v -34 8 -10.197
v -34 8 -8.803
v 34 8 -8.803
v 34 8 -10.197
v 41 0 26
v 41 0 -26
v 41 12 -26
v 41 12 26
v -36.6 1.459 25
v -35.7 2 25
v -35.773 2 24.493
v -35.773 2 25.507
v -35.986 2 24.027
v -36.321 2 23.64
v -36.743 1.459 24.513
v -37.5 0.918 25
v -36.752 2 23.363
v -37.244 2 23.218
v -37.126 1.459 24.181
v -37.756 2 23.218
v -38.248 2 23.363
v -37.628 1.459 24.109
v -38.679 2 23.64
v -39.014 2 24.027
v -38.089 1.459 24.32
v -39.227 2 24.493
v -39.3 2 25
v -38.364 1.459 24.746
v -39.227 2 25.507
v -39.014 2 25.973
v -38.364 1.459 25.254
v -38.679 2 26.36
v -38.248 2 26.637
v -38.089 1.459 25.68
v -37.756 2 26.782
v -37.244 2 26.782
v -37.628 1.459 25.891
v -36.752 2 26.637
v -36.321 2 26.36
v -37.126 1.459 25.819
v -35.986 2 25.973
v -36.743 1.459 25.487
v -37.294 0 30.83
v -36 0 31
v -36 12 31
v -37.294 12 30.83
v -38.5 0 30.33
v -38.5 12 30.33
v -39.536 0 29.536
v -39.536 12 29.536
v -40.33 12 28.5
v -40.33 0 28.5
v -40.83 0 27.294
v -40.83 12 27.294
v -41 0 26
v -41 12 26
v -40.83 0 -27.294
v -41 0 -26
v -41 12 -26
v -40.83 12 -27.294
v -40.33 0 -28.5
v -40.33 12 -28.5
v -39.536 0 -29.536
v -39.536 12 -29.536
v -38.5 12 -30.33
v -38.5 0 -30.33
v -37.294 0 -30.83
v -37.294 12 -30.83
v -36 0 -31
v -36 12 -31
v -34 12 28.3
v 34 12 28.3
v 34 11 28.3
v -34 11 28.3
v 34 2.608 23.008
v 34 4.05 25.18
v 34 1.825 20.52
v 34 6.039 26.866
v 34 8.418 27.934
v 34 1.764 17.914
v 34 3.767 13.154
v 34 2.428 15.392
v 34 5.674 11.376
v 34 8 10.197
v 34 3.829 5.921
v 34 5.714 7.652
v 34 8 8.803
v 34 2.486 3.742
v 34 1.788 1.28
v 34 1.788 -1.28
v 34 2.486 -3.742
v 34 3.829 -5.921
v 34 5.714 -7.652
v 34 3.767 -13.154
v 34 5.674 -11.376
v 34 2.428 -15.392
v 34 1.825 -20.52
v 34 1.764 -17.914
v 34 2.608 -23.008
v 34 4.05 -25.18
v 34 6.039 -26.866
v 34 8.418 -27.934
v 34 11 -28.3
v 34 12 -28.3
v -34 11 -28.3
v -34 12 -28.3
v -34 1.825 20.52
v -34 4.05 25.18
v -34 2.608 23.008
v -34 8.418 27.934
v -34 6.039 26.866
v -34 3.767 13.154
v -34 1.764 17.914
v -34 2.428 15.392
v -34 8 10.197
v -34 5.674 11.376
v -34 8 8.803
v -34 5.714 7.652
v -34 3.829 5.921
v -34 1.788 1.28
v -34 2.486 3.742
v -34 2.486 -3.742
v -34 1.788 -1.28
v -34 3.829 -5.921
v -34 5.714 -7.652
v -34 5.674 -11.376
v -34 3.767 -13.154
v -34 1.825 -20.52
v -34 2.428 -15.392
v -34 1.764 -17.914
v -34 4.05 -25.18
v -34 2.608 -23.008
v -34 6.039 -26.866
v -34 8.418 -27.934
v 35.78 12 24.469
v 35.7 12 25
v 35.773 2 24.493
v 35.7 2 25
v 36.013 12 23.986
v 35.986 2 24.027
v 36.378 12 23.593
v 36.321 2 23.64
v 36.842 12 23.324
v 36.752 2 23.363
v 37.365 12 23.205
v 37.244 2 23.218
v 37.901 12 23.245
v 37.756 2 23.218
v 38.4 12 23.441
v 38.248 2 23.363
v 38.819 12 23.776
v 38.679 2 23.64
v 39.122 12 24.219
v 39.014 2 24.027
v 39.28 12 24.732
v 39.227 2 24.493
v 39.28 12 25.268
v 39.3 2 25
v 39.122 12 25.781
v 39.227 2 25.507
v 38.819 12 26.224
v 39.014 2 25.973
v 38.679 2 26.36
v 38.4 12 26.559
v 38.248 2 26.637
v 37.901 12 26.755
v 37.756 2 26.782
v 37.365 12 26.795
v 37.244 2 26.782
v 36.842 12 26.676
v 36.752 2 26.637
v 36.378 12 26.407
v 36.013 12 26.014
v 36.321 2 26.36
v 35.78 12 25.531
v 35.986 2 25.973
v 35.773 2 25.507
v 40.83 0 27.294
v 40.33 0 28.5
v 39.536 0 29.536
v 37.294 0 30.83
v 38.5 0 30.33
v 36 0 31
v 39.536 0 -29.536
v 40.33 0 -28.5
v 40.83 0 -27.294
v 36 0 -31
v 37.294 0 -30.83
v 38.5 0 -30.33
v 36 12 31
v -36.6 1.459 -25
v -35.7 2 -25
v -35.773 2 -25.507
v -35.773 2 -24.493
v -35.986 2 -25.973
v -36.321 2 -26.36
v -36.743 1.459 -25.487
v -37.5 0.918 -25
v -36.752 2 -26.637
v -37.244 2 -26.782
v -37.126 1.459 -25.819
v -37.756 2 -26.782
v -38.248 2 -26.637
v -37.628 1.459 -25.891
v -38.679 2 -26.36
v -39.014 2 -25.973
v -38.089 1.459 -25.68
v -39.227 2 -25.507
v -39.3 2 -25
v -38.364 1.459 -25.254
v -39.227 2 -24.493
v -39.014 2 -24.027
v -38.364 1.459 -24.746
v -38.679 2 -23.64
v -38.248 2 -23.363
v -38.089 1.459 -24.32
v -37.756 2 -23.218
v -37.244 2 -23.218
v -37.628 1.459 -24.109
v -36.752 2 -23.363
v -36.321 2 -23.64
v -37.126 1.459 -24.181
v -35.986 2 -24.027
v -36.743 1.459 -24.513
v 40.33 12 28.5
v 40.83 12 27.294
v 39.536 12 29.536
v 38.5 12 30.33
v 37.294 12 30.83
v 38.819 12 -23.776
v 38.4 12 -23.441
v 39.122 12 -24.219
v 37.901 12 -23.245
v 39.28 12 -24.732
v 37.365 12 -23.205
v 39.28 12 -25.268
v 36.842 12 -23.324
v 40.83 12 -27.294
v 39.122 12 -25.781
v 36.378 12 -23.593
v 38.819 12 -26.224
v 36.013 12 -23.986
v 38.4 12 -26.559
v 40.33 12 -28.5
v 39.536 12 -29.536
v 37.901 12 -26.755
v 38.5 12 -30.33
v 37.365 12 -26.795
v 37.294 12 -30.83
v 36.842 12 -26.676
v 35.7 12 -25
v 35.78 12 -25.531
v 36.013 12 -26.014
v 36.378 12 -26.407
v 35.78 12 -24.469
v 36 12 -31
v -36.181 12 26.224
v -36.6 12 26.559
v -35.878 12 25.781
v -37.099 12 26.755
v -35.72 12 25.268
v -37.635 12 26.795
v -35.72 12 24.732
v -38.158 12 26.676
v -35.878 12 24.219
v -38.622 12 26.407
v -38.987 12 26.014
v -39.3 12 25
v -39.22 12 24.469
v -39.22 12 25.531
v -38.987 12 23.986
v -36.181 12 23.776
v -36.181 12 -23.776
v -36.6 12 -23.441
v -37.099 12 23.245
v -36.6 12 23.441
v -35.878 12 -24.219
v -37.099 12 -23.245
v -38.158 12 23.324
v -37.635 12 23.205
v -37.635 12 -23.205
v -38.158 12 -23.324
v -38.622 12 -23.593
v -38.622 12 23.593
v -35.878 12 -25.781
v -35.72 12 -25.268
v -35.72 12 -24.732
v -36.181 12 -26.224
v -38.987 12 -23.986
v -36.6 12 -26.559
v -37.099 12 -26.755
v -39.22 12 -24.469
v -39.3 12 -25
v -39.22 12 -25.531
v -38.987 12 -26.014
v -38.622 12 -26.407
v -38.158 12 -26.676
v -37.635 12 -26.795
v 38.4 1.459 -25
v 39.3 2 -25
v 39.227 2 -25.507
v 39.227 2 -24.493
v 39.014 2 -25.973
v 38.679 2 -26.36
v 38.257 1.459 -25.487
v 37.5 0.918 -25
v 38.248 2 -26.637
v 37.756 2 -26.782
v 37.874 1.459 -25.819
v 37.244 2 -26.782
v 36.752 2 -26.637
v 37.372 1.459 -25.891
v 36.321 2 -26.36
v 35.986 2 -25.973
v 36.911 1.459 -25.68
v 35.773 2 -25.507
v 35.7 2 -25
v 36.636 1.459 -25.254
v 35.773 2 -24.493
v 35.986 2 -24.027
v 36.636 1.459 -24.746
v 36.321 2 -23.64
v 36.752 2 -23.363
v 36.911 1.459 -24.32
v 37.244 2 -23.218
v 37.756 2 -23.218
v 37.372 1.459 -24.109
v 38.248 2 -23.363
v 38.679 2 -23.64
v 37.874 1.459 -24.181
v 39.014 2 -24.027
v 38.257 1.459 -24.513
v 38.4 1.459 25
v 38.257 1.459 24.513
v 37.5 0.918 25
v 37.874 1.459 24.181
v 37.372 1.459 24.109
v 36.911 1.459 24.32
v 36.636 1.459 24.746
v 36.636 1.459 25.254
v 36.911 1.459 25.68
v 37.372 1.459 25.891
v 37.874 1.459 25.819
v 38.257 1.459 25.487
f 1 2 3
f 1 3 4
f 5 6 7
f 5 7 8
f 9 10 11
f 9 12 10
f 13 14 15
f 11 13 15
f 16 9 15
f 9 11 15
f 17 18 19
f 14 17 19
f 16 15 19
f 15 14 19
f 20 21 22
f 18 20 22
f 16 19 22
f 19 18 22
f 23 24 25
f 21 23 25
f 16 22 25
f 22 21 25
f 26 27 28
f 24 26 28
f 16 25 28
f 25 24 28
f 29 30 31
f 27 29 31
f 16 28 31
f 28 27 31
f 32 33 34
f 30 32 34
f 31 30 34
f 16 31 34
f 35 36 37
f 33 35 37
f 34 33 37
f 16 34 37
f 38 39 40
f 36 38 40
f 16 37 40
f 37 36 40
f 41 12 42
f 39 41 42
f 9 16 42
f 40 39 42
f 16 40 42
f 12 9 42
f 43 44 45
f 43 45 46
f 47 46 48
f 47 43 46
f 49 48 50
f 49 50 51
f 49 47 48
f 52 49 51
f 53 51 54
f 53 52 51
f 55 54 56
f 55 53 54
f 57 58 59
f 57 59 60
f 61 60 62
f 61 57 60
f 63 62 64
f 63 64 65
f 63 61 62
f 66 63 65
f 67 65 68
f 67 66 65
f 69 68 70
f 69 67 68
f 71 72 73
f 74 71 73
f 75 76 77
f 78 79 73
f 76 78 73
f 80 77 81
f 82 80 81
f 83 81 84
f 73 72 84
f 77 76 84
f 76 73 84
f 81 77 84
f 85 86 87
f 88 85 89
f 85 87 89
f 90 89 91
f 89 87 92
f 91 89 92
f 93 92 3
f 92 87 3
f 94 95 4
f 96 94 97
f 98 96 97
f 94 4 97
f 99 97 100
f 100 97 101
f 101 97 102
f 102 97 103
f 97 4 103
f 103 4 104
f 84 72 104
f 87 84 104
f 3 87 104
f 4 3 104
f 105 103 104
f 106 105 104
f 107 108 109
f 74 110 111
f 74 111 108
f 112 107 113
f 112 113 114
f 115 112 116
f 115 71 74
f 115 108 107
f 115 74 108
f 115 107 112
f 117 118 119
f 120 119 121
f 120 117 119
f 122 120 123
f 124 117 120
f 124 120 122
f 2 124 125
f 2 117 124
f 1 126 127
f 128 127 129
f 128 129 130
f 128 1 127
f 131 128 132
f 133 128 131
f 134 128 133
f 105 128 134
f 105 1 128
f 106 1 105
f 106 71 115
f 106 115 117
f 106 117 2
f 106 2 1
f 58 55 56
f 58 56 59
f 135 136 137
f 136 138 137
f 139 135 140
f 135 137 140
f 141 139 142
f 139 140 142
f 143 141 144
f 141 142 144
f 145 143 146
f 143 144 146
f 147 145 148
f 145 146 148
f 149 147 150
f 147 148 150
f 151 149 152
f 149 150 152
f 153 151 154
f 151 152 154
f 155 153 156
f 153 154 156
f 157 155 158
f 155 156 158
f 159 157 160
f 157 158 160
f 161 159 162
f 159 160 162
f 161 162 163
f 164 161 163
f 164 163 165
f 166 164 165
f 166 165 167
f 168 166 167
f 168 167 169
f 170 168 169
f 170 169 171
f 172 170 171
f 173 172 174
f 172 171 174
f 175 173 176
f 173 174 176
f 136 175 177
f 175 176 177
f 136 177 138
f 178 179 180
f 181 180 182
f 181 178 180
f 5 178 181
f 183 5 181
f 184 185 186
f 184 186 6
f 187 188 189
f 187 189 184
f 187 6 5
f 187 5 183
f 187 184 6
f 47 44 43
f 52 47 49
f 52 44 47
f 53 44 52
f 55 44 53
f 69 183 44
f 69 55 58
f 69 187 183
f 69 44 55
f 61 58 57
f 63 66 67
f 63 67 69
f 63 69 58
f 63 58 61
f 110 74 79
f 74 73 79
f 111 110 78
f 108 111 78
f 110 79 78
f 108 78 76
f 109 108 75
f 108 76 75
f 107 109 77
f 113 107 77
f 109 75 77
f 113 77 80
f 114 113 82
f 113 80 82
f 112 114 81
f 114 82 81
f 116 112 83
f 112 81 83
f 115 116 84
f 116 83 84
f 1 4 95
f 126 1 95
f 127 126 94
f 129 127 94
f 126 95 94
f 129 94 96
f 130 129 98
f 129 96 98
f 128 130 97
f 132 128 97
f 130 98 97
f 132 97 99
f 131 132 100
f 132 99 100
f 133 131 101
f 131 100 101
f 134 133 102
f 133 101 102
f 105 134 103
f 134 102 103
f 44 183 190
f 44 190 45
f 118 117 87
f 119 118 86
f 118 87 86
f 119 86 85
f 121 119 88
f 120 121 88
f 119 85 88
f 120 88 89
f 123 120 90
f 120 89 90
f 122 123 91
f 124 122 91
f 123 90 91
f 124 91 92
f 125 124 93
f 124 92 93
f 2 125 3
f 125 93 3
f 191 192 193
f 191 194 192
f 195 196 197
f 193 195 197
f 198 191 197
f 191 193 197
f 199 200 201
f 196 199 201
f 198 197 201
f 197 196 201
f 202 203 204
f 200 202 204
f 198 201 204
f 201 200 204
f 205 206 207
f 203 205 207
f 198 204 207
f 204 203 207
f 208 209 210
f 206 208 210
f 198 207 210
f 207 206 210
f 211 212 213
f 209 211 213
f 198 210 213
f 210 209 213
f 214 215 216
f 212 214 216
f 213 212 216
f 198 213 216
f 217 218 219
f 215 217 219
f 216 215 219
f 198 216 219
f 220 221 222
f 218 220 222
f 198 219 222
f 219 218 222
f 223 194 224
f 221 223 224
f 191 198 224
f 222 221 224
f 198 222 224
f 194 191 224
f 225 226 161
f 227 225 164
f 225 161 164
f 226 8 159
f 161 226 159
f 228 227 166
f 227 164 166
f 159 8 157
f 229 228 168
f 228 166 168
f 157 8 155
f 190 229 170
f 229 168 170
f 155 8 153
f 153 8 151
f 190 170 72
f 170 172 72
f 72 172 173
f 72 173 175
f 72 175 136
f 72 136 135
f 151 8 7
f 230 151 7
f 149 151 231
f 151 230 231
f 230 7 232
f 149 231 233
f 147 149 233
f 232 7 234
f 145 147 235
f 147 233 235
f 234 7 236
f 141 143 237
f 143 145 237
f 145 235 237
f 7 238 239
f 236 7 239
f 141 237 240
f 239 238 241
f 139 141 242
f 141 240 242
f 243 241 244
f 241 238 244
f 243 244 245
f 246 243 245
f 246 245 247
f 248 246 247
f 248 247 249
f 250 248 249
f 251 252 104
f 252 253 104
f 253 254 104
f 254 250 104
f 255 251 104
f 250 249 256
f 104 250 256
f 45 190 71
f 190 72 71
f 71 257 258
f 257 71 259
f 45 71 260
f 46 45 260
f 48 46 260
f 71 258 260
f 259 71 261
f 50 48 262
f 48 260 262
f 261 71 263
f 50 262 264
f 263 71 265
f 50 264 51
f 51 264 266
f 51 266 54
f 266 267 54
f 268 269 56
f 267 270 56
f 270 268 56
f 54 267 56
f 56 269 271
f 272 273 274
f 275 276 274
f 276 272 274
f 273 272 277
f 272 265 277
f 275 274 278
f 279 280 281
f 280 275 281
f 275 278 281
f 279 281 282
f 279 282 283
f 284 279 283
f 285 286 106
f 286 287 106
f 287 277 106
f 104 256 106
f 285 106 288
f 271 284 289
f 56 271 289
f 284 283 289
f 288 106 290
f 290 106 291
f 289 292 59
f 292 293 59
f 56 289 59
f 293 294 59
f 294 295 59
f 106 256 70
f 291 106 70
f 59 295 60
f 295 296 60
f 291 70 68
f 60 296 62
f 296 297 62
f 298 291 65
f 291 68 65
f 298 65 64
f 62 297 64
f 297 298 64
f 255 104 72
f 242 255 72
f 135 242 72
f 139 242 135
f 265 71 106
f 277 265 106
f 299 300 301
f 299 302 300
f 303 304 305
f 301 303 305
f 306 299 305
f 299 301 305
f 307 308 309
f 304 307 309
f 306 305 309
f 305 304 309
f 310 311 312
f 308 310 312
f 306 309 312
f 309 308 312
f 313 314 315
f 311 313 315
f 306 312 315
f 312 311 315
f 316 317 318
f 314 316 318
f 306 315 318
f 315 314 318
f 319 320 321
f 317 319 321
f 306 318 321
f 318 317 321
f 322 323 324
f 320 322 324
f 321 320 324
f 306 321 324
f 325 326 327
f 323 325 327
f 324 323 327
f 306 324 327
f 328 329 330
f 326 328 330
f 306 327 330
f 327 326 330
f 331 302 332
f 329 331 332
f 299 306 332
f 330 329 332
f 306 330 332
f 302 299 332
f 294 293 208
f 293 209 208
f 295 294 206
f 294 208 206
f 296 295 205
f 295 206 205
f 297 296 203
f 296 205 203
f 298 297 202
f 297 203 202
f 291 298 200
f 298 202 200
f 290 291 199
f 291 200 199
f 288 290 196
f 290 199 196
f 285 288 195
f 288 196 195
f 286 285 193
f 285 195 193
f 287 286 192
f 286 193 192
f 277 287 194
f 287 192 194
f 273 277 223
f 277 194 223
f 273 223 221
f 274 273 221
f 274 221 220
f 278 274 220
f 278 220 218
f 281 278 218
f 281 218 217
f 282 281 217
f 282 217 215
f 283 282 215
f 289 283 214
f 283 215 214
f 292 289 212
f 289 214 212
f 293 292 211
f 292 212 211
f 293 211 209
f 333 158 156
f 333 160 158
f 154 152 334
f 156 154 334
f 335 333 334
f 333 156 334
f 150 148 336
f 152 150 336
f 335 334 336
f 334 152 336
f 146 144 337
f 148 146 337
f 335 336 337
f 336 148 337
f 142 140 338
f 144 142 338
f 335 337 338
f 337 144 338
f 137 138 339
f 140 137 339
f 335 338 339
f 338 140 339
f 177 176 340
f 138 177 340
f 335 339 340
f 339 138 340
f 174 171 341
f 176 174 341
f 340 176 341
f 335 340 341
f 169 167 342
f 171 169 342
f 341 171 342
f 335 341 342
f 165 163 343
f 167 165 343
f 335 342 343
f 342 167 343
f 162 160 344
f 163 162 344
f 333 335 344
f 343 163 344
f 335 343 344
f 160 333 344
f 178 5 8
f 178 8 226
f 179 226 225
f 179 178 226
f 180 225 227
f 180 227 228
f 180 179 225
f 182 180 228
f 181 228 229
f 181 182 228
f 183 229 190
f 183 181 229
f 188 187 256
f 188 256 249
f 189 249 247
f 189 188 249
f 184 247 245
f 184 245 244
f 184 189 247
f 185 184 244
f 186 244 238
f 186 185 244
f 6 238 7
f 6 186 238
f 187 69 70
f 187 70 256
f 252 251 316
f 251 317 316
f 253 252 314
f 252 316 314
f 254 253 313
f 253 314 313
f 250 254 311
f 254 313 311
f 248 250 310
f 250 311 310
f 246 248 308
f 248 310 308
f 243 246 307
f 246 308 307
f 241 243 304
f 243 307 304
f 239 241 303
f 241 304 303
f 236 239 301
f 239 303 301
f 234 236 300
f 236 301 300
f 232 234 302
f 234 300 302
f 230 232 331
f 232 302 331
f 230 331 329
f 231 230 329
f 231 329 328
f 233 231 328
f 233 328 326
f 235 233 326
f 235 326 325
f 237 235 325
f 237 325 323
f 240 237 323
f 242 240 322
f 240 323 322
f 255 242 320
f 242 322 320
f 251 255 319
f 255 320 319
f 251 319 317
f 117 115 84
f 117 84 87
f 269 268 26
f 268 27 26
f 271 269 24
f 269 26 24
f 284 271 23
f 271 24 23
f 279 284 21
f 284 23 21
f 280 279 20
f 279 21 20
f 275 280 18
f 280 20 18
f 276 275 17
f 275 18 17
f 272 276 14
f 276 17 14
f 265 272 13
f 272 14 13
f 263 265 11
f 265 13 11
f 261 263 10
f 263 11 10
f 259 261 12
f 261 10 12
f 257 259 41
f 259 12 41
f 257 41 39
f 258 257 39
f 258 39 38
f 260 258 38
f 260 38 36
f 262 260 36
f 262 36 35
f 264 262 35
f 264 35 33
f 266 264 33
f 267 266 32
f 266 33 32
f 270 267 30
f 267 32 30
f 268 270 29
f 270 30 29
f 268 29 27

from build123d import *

# Parameters (mm, degrees)
BOSS_EXTRUDE1_DEPTH            = 12
CUT_EXTRUDE1_DEPTH             = 34
F_3_6_3_6_DIAMETER_HOLE1_D     = 3.6
F_3_6_3_6_DIAMETER_HOLE1_DEPTH = 10
F_3_6_3_6_DIAMETER_HOLE1_TIP   = 1.081549114


with BuildPart() as part:
    # Sketch1 → Boss-Extrude1 (new body)
    with BuildSketch(Plane(origin=(0, 0, 0), x_dir=(1, 0, 0), z_dir=(0, 1, 0))):
        with BuildLine():
            Line((-36, 31), (36, 31))
            ThreePointArc((36, 31), (39.535533906, 29.535533906), (41, 26))
            Line((41, 26), (41, -26))
            ThreePointArc((41, -26), (39.535533906, -29.535533906), (36, -31))
            Line((36, -31), (-36, -31))
            ThreePointArc((-36, -31), (-39.535533906, -29.535533906), (-41, -26))
            Line((-41, -26), (-41, 26))
            ThreePointArc((-41, 26), (-39.535533906, 29.535533906), (-36, 31))
        make_face()
    extrude(amount=BOSS_EXTRUDE1_DEPTH)

    # Sketch2 → Cut-Extrude1 (cut, symmetric)
    with BuildSketch(Plane(origin=(0, 0, 0), x_dir=(0, 0, -1), z_dir=(1, 0, 0))):
        with BuildLine():
            Line((-10.197159549, 8), (-8.802840451, 8))
            ThreePointArc((-8.802840451, 8), (0, 1.7), (8.802840451, 8))
            Line((8.802840451, 8), (10.197159549, 8))
            ThreePointArc((10.197159549, 8), (20.520457794, 1.825131712), (28.3, 11))
            Line((28.3, 11), (28.3, 17.866390663))
            Line((28.3, 17.866390663), (-28.3, 17.866390663))
            Line((-28.3, 17.866390663), (-28.3, 11))
            ThreePointArc((-28.3, 11), (-20.520457794, 1.825131712), (-10.197159549, 8))
        make_face()
    extrude(amount=CUT_EXTRUDE1_DEPTH, both=True, mode=Mode.SUBTRACT)

    # Ø3.6 (3.6) Diameter Hole1
    with Locations(Plane(origin=(0, 12, 0), x_dir=(1, 0, 0), z_dir=(0, 1, 0))):
        with Locations((-37.5, 25), (-37.5, -25), (37.5, -25), (37.5, 25)):
            Hole(F_3_6_3_6_DIAMETER_HOLE1_D / 2, depth=F_3_6_3_6_DIAMETER_HOLE1_DEPTH)
            with Locations((0, 0, -(F_3_6_3_6_DIAMETER_HOLE1_DEPTH + F_3_6_3_6_DIAMETER_HOLE1_TIP / 2))):  # 118° drill point
                Cone(0, F_3_6_3_6_DIAMETER_HOLE1_D / 2, F_3_6_3_6_DIAMETER_HOLE1_TIP, mode=Mode.SUBTRACT)


solid = part.part
